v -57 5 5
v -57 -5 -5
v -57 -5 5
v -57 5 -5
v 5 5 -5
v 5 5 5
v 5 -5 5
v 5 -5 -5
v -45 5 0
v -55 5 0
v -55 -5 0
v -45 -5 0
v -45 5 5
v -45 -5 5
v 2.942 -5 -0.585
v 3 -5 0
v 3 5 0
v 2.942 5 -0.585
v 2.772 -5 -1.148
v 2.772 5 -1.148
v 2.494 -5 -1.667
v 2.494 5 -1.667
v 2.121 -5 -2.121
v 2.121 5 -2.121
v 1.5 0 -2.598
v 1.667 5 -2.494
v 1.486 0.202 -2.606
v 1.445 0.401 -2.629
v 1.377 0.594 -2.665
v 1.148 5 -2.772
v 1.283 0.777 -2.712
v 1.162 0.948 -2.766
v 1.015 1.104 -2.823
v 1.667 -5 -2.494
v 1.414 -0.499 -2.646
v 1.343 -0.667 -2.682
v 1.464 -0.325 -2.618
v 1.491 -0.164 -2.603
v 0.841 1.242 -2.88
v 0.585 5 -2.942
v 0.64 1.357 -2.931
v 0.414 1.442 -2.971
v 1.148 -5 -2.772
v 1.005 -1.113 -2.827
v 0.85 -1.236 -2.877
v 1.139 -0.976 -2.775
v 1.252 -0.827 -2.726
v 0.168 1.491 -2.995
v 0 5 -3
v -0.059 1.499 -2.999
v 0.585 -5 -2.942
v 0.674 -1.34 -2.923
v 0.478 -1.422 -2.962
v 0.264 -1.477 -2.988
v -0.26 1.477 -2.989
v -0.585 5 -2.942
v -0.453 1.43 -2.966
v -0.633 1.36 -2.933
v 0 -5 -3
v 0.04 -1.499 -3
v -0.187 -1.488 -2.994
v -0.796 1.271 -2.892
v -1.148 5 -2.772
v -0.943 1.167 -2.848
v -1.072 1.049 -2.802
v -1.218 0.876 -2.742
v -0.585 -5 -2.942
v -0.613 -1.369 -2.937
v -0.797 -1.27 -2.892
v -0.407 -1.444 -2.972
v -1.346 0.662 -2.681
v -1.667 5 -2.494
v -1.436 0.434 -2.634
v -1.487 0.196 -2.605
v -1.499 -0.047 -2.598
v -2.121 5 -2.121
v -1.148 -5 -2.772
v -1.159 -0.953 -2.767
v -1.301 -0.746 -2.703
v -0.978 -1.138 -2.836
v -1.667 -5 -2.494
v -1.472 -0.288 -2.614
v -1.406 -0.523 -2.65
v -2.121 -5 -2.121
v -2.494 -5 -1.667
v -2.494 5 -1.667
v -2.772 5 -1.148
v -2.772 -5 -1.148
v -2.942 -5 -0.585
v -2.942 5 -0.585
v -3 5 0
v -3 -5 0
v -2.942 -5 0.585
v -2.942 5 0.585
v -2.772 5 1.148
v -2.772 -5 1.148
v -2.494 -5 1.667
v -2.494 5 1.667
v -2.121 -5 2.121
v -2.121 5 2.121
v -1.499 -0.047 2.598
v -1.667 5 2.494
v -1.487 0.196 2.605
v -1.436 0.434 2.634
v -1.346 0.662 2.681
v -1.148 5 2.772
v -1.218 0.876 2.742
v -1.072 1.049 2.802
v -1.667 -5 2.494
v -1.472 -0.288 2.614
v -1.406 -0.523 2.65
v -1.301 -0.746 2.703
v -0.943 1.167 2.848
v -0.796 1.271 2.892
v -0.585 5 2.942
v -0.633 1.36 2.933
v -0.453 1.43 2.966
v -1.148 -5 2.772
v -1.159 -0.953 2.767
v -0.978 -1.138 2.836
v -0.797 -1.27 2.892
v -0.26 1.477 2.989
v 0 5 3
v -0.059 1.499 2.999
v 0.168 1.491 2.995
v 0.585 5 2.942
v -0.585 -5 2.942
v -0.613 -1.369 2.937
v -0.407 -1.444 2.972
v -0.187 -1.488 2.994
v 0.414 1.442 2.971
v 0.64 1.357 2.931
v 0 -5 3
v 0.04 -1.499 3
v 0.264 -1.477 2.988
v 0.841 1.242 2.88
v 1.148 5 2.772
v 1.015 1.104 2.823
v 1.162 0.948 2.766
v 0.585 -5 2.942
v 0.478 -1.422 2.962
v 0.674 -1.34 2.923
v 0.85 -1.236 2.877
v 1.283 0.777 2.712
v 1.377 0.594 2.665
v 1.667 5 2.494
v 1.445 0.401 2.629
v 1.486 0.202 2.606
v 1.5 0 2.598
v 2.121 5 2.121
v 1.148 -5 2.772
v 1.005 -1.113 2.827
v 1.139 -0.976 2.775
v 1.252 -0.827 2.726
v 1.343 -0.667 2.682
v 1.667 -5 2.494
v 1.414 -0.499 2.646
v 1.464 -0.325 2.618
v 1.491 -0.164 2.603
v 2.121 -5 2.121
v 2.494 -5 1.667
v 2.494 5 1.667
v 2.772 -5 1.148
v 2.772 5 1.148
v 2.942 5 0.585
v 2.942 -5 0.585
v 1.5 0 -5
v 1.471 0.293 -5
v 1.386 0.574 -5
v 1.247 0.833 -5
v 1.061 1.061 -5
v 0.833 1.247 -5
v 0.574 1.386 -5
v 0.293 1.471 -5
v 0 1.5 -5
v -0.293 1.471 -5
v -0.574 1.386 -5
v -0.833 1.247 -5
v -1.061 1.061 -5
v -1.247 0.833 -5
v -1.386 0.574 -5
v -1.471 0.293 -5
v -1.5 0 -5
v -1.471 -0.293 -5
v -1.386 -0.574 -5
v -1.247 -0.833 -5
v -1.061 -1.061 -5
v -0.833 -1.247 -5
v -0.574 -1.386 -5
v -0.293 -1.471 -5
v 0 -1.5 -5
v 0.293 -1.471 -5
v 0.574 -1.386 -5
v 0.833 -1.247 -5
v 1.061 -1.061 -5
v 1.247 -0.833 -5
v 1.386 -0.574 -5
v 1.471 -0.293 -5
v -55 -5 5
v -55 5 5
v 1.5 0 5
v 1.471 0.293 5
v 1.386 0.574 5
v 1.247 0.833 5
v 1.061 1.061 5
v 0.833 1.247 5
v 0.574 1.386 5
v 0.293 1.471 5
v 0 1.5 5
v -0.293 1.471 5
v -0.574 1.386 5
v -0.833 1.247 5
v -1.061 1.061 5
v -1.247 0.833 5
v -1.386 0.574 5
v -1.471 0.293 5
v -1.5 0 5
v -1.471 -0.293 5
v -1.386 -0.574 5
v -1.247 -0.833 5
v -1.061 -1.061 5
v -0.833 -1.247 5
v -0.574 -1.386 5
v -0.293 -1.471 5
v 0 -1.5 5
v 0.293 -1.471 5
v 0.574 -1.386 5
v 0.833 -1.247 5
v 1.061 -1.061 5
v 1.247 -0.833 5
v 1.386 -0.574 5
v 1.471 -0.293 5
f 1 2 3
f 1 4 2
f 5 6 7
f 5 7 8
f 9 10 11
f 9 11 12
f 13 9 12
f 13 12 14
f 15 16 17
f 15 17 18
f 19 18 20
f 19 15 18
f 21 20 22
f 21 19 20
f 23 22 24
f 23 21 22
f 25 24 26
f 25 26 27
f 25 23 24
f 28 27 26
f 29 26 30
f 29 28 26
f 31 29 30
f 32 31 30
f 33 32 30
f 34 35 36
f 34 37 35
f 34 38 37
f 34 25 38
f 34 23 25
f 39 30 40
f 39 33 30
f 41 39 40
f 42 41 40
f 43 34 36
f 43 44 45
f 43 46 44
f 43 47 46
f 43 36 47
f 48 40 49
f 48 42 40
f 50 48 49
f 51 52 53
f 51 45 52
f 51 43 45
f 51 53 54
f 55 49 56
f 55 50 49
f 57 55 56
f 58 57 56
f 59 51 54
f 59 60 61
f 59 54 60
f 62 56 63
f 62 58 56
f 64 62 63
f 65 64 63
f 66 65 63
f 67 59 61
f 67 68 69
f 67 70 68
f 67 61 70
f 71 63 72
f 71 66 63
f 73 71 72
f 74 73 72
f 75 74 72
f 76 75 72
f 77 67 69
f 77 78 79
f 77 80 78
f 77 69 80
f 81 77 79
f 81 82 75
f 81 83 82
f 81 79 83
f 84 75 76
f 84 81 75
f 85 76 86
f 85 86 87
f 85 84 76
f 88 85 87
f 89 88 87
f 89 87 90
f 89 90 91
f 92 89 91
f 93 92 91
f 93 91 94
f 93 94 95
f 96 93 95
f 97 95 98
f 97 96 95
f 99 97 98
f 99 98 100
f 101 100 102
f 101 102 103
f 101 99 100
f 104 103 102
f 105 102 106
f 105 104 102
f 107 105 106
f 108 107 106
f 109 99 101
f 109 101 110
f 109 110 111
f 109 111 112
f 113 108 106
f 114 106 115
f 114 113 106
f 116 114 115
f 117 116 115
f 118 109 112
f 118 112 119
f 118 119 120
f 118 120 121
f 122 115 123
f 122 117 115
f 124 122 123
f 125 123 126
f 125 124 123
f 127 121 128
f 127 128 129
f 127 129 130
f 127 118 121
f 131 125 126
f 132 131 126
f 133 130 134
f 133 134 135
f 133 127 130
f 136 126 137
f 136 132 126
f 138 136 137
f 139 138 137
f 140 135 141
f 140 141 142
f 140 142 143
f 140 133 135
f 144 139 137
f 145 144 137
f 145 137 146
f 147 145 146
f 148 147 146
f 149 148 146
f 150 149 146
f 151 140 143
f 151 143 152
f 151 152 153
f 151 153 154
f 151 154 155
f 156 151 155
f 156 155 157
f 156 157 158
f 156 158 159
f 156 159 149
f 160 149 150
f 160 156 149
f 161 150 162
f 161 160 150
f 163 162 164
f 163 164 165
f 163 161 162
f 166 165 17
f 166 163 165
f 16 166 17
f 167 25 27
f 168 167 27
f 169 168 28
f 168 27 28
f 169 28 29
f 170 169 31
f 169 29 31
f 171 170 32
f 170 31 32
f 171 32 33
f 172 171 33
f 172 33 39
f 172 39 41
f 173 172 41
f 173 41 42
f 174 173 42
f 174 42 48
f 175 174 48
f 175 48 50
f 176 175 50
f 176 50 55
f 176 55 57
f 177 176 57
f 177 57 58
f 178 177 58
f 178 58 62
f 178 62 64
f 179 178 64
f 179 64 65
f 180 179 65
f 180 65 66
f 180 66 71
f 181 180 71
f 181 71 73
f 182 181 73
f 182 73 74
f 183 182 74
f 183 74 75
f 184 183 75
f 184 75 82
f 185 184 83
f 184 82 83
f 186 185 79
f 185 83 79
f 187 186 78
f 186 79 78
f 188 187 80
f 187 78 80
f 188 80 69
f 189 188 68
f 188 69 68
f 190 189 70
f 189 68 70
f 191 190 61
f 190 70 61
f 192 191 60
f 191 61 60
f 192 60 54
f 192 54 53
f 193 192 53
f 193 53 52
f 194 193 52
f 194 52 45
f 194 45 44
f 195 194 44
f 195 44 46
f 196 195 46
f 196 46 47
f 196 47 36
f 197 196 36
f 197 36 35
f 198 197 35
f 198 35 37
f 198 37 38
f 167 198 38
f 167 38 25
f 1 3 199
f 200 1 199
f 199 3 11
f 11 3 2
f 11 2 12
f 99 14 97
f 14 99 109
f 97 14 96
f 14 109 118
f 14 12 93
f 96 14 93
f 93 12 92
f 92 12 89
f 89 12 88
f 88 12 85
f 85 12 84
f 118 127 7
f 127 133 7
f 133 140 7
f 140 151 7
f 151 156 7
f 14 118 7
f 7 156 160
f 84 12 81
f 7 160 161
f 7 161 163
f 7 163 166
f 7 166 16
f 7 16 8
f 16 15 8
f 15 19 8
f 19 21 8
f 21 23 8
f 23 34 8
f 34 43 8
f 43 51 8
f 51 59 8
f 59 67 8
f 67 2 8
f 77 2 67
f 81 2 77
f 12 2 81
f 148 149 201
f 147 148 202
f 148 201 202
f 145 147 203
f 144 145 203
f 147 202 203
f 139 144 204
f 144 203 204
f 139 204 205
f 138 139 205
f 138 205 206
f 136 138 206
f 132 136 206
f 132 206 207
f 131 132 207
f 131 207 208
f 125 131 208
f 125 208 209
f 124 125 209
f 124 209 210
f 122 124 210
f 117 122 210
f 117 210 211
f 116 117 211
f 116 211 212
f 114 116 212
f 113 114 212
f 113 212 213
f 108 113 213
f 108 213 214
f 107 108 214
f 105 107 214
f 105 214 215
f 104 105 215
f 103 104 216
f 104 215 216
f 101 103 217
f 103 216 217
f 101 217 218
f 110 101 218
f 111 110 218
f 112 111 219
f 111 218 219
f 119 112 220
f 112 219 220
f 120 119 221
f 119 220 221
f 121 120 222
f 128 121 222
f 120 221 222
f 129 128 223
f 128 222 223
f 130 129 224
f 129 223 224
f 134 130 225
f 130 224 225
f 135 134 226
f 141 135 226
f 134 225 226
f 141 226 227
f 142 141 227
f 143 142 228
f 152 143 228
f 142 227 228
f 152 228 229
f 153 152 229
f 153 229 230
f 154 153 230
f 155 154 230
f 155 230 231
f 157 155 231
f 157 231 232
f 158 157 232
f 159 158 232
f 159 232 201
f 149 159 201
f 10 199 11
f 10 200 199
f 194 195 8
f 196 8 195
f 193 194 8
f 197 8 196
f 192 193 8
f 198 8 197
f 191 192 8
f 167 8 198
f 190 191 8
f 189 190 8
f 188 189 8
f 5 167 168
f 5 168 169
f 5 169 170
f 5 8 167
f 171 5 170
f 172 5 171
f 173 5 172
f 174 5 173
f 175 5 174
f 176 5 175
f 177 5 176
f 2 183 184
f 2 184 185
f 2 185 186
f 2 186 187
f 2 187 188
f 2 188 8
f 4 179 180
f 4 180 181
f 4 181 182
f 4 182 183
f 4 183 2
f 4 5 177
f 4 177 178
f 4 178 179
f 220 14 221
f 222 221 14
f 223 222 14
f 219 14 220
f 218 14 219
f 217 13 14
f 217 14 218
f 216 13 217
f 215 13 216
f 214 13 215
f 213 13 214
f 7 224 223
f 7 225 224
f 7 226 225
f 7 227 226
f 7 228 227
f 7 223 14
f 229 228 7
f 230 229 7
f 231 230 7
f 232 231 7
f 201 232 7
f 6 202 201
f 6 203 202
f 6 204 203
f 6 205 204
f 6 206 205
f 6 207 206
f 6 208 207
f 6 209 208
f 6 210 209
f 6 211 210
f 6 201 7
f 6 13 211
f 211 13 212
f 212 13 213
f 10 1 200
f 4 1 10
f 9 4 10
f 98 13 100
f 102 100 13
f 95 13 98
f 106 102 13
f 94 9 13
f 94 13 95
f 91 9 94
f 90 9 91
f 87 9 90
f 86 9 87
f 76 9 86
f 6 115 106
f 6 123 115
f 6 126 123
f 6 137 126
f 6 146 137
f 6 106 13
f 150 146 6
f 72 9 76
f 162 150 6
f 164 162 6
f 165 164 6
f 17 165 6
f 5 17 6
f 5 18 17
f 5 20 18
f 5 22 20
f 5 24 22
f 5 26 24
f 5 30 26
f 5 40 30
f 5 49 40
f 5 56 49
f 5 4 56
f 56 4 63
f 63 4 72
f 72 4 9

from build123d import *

# Parameters (mm, degrees)
SKETCH_1_R          = 3
EXTRUDE_1_DEPTH     = 5
SKETCH_3_R          = 1.5
CUT_EXTRUDE_1_DEPTH = 11


with BuildPart() as part:
    # 草圖1 → 填料-伸長1 (new body, symmetric)
    with BuildSketch(Plane(origin=(0, 0, 0), x_dir=(1, 0, 0), z_dir=(0, 1, 0))):
        Polygon((-55, -5), (-55, 0), (-45, 0), (-45, -5), (5, -5), (5, 5), (-57, 5), (-57, -5), align=None)
        Circle(SKETCH_1_R, mode=Mode.SUBTRACT)
    extrude(amount=EXTRUDE_1_DEPTH, both=True)

    # 草圖3 → 除料-伸長1 (cut, through all)
    with BuildSketch(Plane.XY.offset(5)):
        Circle(SKETCH_3_R)
    extrude(amount=-CUT_EXTRUDE_1_DEPTH, mode=Mode.SUBTRACT)


solid = part.part
